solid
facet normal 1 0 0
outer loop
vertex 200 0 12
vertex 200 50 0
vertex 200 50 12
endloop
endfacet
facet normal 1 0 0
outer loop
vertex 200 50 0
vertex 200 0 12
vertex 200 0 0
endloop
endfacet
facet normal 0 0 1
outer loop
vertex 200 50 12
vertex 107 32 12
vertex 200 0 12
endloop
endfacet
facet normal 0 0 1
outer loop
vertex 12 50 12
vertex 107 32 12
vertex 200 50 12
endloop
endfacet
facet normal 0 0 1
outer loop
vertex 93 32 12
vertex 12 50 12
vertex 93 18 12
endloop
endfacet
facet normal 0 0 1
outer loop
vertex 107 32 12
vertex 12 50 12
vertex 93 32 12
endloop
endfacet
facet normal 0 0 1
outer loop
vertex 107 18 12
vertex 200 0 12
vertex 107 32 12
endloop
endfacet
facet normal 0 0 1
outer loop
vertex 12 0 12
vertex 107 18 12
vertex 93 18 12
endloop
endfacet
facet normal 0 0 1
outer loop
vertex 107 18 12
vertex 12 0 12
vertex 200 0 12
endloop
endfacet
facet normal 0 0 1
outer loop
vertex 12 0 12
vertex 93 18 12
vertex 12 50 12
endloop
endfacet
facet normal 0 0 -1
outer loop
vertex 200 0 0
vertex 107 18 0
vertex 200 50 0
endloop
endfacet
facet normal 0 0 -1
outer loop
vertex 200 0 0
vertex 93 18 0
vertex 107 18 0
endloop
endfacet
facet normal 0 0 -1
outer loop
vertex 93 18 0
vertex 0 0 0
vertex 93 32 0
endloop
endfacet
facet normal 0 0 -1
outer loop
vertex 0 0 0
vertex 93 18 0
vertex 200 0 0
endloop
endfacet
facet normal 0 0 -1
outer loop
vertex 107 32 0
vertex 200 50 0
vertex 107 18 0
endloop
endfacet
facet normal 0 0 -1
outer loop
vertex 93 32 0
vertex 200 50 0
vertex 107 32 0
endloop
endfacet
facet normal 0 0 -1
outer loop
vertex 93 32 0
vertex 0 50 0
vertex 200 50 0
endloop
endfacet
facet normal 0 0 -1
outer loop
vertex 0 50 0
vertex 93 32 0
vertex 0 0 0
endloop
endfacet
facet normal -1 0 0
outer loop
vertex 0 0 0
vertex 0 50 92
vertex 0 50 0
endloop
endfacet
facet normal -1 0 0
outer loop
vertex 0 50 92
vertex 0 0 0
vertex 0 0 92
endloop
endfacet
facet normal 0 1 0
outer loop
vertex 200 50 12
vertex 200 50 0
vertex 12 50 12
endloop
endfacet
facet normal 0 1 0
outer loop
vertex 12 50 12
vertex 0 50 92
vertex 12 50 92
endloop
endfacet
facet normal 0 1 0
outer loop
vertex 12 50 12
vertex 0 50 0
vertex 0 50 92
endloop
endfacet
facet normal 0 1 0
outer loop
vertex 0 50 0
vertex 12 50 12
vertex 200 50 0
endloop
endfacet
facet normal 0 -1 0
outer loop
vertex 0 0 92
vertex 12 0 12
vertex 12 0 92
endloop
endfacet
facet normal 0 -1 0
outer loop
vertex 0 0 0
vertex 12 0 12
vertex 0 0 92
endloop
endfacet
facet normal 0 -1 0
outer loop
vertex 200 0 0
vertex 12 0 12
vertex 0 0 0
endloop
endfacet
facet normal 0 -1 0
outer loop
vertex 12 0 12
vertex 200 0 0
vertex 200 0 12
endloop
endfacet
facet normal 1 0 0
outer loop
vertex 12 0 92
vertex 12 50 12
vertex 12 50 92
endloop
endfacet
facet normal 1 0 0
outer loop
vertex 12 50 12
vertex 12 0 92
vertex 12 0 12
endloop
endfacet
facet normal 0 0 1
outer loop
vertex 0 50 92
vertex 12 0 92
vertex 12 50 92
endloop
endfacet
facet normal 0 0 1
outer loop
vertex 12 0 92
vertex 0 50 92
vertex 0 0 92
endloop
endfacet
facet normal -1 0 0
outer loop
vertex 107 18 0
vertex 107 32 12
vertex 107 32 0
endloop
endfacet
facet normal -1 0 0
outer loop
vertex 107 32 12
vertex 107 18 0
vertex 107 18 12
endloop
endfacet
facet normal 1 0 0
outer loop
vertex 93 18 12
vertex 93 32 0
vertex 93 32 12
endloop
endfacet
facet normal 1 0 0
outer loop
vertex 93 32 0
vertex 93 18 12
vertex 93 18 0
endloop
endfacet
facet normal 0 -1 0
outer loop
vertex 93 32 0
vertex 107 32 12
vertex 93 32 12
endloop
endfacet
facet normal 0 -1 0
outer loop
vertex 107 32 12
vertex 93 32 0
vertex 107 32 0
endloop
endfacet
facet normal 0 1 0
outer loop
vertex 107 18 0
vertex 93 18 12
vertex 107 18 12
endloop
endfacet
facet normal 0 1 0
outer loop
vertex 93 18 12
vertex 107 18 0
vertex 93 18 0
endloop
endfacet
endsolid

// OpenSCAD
$fn = 32;

// ----------------------------------------------------------------------
// Gantry bracket: 200-250 mm L bracket
// ----------------------------------------------------------------------

// --- parameters (mm) ---
base_l = 200;             // base arm length, X
arm_w = 50;               // arm width, Y
thick = 12;               // arm thickness
up_h = 80;                // vertical arm height, Z
slot_w = 14;              // adjustment slot width in the base

total_h = up_h + thick;  // overall height

difference() {
  union() {
    cube([base_l, arm_w, thick]);
    cube([thick, arm_w, total_h]);
  }
  translate([base_l / 2 - slot_w / 2, arm_w / 2 - slot_w / 2, -1])
    cube([slot_w, slot_w, thick + 2]);
}
